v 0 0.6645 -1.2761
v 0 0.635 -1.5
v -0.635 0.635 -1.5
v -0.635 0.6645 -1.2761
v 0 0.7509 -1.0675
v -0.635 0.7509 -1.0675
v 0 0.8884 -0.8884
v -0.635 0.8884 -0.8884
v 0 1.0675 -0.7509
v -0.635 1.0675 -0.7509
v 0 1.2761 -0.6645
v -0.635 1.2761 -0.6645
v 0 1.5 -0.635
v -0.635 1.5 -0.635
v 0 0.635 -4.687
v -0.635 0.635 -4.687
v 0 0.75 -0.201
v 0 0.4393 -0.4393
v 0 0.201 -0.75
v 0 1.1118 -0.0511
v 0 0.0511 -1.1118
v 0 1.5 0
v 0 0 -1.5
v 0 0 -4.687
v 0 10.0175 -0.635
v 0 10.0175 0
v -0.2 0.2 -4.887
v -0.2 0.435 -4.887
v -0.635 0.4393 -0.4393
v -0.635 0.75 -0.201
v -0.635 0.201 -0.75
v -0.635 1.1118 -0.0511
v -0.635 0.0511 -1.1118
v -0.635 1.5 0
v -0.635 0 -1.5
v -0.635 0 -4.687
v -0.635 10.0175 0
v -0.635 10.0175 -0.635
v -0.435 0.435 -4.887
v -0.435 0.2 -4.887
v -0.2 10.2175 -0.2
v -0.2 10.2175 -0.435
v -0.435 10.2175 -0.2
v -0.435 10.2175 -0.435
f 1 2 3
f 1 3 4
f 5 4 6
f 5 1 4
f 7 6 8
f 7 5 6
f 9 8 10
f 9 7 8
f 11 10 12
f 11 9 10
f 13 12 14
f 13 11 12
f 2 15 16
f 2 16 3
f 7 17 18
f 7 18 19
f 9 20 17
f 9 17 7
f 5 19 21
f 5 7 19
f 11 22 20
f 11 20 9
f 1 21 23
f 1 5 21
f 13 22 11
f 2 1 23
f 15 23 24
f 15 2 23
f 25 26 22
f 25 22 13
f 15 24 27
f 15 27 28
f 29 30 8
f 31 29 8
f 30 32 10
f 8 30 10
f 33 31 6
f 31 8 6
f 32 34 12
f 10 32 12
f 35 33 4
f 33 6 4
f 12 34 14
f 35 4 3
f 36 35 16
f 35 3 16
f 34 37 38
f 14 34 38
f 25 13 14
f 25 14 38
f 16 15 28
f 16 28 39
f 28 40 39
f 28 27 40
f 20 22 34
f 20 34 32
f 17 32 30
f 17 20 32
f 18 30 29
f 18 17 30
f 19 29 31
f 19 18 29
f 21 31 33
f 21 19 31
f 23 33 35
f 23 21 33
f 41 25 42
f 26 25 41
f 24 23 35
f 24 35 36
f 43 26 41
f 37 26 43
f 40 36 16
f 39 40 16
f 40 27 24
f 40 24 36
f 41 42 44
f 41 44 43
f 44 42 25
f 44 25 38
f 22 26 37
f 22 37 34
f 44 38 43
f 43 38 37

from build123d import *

# Parameters (mm, degrees)
BOSS_EXTRUDE1_DEPTH = 0.635
CHAMFER1_SIZE       = 0.2


with BuildPart() as part:
    # Sketch1 → Boss-Extrude1 (new body)
    with BuildSketch(Plane(origin=(0, 0, 0), x_dir=(0, 0, -1), z_dir=(1, 0, 0))):
        with BuildLine():
            Line((0.635, 1.5), (0.635, 10.2175))
            Line((0.635, 10.2175), (0, 10.2175))
            Line((0, 10.2175), (0, 1.5))
            ThreePointArc((0, 1.5), (0.439339828, 0.439339828), (1.5, 0))
            Line((1.5, 0), (4.887, 0))
            Line((4.887, 0), (4.887, 0.635))
            Line((4.887, 0.635), (1.5, 0.635))
            ThreePointArc((1.5, 0.635), (0.888352634, 0.888352634), (0.635, 1.5))
        make_face()
    extrude(amount=-BOSS_EXTRUDE1_DEPTH)

    # Chamfer1
    chamfer1_edges = [part.edges().sort_by_distance(p)[0] for p in [
        (-0.635, 0.3175, -4.887),
        (-0.3175, 10.2175, 0),
        (-0.3175, 10.2175, -0.635),
        (-0.3175, 0.635, -4.887),
        (-0.3175, 0, -4.887),
        (-0.635, 10.2175, -0.3175),
        (0, 10.2175, -0.3175),
        (0, 0.3175, -4.887),
    ]]
    chamfer(chamfer1_edges, length=CHAMFER1_SIZE)


solid = part.part
